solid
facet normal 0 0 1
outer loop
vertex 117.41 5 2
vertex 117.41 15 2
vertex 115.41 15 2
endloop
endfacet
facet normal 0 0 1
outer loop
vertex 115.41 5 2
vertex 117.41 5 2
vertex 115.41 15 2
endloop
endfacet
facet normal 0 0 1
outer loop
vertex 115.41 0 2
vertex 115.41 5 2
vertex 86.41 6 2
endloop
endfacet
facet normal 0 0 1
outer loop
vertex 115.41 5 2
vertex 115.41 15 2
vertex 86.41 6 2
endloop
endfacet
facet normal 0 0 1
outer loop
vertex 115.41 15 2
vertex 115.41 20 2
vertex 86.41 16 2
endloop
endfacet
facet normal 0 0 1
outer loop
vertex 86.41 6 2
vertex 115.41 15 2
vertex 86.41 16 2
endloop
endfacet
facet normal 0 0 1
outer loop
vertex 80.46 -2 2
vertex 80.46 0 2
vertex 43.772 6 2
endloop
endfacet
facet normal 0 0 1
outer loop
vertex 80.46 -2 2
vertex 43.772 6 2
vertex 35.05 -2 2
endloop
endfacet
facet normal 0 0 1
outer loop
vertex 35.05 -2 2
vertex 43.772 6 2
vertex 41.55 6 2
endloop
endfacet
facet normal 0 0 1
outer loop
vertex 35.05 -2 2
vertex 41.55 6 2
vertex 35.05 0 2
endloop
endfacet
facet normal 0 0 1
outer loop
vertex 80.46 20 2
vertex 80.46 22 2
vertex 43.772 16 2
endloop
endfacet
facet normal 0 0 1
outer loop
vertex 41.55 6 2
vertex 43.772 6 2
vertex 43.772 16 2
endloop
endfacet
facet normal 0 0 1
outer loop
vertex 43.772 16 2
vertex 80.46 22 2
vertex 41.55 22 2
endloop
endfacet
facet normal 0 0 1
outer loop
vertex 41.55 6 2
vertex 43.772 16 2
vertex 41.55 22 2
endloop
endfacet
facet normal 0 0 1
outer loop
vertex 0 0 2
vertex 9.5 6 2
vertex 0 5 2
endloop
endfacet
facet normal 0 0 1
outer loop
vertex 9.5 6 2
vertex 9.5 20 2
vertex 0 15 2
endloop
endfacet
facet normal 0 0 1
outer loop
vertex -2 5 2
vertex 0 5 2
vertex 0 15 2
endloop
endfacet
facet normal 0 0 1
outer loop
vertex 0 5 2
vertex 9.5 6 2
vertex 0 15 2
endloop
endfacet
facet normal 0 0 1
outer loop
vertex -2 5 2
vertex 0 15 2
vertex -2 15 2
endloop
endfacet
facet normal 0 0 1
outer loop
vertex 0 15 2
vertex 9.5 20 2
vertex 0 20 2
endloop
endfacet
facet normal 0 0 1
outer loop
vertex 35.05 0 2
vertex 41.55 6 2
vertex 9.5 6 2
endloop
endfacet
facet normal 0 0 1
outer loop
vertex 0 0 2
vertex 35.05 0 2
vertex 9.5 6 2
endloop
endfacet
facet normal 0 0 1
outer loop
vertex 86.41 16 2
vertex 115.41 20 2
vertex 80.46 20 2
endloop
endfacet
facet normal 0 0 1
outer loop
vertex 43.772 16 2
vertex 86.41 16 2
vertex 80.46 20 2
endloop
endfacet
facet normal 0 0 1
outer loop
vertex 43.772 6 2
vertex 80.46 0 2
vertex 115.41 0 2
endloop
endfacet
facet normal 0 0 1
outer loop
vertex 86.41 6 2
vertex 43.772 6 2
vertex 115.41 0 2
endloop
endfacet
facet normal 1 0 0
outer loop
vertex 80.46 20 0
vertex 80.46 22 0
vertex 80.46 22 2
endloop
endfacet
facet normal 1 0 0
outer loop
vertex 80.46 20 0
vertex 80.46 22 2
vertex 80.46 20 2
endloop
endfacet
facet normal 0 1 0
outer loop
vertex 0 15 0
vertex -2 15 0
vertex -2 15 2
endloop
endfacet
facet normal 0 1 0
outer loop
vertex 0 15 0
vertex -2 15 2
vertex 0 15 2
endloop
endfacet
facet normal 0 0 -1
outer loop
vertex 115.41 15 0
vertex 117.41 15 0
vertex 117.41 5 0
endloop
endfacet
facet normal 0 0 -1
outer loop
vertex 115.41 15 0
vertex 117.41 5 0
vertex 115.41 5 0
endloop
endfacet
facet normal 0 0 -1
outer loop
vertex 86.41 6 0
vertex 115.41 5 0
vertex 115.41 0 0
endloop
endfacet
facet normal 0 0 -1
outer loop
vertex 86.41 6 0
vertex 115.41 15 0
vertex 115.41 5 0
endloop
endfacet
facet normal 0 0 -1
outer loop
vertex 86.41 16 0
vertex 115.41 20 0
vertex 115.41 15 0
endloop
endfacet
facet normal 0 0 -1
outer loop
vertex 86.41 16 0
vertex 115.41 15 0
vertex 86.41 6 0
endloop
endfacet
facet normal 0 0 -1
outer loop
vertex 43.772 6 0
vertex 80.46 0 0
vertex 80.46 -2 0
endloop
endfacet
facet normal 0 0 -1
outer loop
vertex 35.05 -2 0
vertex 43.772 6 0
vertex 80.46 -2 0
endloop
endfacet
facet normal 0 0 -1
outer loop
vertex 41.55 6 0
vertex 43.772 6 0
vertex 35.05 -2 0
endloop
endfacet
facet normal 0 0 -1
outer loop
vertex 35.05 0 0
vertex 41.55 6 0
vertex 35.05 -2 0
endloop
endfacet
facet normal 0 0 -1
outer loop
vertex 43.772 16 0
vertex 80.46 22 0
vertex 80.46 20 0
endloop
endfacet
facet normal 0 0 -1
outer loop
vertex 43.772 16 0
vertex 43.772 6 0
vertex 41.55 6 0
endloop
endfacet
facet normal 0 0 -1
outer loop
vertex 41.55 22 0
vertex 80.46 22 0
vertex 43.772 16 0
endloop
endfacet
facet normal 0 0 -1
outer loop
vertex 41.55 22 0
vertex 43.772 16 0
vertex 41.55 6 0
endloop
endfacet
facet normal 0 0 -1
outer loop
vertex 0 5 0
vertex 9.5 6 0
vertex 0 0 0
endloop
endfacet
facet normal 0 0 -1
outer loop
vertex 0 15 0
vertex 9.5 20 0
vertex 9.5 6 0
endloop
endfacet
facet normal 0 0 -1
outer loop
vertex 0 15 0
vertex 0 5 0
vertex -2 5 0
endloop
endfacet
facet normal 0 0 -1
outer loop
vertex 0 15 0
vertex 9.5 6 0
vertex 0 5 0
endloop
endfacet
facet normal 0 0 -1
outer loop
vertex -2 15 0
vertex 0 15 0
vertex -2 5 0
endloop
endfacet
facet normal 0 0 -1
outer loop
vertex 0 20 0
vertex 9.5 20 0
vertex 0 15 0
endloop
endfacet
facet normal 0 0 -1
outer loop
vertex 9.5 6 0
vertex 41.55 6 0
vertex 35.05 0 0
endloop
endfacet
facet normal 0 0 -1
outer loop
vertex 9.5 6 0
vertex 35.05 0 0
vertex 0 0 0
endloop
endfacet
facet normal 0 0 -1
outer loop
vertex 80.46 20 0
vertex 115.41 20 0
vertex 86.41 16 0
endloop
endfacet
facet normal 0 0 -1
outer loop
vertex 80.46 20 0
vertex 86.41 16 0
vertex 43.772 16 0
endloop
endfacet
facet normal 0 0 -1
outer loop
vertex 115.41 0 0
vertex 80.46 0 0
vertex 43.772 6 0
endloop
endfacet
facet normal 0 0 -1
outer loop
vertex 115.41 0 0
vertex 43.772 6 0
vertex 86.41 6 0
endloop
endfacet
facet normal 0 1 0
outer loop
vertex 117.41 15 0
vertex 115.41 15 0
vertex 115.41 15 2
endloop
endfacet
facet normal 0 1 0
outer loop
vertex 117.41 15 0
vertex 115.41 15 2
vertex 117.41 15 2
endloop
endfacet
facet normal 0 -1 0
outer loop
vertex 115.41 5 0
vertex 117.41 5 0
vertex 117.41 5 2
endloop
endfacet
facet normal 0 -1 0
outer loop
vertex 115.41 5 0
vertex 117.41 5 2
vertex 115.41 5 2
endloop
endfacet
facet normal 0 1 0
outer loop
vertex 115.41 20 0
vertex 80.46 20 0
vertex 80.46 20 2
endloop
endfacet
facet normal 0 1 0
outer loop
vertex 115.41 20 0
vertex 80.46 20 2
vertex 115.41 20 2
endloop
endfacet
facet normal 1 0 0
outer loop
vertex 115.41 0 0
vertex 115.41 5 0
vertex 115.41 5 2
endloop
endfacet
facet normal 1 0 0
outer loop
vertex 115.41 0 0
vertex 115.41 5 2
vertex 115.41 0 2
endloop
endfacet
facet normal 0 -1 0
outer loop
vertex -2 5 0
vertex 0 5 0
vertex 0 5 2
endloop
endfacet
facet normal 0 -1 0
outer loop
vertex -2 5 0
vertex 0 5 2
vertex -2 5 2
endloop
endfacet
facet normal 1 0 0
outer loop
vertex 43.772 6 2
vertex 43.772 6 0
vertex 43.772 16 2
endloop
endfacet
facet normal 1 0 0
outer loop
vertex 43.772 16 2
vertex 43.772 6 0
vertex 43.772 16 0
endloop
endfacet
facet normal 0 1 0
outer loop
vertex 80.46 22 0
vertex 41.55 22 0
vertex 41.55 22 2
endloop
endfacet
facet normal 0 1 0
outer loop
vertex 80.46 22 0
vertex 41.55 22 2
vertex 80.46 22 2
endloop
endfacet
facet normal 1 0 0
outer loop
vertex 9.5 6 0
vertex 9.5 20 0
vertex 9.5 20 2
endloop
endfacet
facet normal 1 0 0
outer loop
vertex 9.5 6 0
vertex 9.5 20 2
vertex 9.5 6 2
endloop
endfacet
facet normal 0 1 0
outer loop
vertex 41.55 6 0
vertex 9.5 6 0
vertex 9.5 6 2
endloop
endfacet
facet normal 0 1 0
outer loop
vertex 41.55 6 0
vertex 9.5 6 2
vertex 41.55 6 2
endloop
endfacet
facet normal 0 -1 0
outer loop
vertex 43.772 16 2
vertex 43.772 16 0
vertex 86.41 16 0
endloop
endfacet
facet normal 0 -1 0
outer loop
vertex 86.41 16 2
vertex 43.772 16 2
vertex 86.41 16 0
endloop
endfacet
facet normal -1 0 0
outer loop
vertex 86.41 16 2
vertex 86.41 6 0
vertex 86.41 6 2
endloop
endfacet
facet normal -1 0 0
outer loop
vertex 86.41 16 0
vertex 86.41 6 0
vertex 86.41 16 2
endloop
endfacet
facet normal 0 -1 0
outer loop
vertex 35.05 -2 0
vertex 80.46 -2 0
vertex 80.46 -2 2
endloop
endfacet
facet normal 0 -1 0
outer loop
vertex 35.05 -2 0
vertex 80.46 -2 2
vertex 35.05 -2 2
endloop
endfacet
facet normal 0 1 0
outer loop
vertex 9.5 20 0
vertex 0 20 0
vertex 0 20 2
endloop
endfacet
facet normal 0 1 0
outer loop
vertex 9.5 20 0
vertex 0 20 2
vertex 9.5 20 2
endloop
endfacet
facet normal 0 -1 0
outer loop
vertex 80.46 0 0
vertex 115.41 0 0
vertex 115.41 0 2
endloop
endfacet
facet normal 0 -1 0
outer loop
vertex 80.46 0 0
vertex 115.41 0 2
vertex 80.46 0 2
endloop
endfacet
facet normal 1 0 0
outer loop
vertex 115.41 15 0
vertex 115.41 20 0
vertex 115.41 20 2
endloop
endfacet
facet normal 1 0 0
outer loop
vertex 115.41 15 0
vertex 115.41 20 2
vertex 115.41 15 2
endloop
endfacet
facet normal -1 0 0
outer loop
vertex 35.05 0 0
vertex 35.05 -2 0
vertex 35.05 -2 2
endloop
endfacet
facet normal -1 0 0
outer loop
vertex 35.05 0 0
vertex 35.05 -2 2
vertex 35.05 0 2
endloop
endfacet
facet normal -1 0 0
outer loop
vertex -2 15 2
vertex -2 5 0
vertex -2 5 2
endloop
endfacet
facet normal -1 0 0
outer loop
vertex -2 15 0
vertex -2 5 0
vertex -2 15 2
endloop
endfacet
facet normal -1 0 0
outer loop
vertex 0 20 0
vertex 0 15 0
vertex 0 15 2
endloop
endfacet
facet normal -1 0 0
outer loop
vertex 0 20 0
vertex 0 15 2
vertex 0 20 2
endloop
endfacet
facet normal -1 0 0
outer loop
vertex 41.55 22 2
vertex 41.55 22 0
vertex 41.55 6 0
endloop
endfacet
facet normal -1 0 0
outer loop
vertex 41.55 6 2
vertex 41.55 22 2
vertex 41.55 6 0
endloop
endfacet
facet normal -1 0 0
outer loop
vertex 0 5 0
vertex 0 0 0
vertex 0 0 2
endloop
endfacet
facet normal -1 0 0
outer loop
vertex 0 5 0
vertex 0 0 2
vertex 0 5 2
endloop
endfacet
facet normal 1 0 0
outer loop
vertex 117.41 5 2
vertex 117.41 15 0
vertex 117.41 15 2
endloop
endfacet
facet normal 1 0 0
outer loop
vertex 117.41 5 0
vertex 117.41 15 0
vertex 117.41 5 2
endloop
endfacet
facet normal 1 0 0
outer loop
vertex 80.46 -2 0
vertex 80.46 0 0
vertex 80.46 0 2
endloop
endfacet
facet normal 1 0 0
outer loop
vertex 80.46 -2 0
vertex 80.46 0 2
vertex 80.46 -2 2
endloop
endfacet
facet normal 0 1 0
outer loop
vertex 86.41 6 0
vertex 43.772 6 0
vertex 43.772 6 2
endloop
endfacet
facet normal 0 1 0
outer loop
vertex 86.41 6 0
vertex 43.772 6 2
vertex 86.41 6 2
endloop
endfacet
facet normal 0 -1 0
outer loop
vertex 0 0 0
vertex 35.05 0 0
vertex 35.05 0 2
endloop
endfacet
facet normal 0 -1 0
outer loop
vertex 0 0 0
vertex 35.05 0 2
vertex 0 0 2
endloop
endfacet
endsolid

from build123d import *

# Parameters (mm, degrees)
SKETCH1_W           = 42.637682839
SKETCH1_H           = 10
BOSS_EXTRUDE1_DEPTH = 2


with BuildPart() as part:
    # Sketch1 → Boss-Extrude1 (new body)
    with BuildSketch(Plane.XY):
        Polygon((0, 20), (9.5, 20), (9.5, 5.999528404), (41.549837727, 5.999528404), (41.549837727, 20), (41.549837727, 22), (80.459837727, 22), (80.459837727, 20), (115.41, 20), (115.41, 15), (117.41, 15), (117.41, 5), (115.41, 5), (115.41, 0), (80.459837727, 0), (80.459837727, -2.000471596), (35.049837727, -2.000471596), (35.049837727, 0), (0, 0), (0, 5), (-2, 5), (-2, 15), (0, 15), align=None)
        with Locations((65.091158581, 11)):
            Rectangle(SKETCH1_W, SKETCH1_H, mode=Mode.SUBTRACT)
    extrude(amount=BOSS_EXTRUDE1_DEPTH)


solid = part.part
